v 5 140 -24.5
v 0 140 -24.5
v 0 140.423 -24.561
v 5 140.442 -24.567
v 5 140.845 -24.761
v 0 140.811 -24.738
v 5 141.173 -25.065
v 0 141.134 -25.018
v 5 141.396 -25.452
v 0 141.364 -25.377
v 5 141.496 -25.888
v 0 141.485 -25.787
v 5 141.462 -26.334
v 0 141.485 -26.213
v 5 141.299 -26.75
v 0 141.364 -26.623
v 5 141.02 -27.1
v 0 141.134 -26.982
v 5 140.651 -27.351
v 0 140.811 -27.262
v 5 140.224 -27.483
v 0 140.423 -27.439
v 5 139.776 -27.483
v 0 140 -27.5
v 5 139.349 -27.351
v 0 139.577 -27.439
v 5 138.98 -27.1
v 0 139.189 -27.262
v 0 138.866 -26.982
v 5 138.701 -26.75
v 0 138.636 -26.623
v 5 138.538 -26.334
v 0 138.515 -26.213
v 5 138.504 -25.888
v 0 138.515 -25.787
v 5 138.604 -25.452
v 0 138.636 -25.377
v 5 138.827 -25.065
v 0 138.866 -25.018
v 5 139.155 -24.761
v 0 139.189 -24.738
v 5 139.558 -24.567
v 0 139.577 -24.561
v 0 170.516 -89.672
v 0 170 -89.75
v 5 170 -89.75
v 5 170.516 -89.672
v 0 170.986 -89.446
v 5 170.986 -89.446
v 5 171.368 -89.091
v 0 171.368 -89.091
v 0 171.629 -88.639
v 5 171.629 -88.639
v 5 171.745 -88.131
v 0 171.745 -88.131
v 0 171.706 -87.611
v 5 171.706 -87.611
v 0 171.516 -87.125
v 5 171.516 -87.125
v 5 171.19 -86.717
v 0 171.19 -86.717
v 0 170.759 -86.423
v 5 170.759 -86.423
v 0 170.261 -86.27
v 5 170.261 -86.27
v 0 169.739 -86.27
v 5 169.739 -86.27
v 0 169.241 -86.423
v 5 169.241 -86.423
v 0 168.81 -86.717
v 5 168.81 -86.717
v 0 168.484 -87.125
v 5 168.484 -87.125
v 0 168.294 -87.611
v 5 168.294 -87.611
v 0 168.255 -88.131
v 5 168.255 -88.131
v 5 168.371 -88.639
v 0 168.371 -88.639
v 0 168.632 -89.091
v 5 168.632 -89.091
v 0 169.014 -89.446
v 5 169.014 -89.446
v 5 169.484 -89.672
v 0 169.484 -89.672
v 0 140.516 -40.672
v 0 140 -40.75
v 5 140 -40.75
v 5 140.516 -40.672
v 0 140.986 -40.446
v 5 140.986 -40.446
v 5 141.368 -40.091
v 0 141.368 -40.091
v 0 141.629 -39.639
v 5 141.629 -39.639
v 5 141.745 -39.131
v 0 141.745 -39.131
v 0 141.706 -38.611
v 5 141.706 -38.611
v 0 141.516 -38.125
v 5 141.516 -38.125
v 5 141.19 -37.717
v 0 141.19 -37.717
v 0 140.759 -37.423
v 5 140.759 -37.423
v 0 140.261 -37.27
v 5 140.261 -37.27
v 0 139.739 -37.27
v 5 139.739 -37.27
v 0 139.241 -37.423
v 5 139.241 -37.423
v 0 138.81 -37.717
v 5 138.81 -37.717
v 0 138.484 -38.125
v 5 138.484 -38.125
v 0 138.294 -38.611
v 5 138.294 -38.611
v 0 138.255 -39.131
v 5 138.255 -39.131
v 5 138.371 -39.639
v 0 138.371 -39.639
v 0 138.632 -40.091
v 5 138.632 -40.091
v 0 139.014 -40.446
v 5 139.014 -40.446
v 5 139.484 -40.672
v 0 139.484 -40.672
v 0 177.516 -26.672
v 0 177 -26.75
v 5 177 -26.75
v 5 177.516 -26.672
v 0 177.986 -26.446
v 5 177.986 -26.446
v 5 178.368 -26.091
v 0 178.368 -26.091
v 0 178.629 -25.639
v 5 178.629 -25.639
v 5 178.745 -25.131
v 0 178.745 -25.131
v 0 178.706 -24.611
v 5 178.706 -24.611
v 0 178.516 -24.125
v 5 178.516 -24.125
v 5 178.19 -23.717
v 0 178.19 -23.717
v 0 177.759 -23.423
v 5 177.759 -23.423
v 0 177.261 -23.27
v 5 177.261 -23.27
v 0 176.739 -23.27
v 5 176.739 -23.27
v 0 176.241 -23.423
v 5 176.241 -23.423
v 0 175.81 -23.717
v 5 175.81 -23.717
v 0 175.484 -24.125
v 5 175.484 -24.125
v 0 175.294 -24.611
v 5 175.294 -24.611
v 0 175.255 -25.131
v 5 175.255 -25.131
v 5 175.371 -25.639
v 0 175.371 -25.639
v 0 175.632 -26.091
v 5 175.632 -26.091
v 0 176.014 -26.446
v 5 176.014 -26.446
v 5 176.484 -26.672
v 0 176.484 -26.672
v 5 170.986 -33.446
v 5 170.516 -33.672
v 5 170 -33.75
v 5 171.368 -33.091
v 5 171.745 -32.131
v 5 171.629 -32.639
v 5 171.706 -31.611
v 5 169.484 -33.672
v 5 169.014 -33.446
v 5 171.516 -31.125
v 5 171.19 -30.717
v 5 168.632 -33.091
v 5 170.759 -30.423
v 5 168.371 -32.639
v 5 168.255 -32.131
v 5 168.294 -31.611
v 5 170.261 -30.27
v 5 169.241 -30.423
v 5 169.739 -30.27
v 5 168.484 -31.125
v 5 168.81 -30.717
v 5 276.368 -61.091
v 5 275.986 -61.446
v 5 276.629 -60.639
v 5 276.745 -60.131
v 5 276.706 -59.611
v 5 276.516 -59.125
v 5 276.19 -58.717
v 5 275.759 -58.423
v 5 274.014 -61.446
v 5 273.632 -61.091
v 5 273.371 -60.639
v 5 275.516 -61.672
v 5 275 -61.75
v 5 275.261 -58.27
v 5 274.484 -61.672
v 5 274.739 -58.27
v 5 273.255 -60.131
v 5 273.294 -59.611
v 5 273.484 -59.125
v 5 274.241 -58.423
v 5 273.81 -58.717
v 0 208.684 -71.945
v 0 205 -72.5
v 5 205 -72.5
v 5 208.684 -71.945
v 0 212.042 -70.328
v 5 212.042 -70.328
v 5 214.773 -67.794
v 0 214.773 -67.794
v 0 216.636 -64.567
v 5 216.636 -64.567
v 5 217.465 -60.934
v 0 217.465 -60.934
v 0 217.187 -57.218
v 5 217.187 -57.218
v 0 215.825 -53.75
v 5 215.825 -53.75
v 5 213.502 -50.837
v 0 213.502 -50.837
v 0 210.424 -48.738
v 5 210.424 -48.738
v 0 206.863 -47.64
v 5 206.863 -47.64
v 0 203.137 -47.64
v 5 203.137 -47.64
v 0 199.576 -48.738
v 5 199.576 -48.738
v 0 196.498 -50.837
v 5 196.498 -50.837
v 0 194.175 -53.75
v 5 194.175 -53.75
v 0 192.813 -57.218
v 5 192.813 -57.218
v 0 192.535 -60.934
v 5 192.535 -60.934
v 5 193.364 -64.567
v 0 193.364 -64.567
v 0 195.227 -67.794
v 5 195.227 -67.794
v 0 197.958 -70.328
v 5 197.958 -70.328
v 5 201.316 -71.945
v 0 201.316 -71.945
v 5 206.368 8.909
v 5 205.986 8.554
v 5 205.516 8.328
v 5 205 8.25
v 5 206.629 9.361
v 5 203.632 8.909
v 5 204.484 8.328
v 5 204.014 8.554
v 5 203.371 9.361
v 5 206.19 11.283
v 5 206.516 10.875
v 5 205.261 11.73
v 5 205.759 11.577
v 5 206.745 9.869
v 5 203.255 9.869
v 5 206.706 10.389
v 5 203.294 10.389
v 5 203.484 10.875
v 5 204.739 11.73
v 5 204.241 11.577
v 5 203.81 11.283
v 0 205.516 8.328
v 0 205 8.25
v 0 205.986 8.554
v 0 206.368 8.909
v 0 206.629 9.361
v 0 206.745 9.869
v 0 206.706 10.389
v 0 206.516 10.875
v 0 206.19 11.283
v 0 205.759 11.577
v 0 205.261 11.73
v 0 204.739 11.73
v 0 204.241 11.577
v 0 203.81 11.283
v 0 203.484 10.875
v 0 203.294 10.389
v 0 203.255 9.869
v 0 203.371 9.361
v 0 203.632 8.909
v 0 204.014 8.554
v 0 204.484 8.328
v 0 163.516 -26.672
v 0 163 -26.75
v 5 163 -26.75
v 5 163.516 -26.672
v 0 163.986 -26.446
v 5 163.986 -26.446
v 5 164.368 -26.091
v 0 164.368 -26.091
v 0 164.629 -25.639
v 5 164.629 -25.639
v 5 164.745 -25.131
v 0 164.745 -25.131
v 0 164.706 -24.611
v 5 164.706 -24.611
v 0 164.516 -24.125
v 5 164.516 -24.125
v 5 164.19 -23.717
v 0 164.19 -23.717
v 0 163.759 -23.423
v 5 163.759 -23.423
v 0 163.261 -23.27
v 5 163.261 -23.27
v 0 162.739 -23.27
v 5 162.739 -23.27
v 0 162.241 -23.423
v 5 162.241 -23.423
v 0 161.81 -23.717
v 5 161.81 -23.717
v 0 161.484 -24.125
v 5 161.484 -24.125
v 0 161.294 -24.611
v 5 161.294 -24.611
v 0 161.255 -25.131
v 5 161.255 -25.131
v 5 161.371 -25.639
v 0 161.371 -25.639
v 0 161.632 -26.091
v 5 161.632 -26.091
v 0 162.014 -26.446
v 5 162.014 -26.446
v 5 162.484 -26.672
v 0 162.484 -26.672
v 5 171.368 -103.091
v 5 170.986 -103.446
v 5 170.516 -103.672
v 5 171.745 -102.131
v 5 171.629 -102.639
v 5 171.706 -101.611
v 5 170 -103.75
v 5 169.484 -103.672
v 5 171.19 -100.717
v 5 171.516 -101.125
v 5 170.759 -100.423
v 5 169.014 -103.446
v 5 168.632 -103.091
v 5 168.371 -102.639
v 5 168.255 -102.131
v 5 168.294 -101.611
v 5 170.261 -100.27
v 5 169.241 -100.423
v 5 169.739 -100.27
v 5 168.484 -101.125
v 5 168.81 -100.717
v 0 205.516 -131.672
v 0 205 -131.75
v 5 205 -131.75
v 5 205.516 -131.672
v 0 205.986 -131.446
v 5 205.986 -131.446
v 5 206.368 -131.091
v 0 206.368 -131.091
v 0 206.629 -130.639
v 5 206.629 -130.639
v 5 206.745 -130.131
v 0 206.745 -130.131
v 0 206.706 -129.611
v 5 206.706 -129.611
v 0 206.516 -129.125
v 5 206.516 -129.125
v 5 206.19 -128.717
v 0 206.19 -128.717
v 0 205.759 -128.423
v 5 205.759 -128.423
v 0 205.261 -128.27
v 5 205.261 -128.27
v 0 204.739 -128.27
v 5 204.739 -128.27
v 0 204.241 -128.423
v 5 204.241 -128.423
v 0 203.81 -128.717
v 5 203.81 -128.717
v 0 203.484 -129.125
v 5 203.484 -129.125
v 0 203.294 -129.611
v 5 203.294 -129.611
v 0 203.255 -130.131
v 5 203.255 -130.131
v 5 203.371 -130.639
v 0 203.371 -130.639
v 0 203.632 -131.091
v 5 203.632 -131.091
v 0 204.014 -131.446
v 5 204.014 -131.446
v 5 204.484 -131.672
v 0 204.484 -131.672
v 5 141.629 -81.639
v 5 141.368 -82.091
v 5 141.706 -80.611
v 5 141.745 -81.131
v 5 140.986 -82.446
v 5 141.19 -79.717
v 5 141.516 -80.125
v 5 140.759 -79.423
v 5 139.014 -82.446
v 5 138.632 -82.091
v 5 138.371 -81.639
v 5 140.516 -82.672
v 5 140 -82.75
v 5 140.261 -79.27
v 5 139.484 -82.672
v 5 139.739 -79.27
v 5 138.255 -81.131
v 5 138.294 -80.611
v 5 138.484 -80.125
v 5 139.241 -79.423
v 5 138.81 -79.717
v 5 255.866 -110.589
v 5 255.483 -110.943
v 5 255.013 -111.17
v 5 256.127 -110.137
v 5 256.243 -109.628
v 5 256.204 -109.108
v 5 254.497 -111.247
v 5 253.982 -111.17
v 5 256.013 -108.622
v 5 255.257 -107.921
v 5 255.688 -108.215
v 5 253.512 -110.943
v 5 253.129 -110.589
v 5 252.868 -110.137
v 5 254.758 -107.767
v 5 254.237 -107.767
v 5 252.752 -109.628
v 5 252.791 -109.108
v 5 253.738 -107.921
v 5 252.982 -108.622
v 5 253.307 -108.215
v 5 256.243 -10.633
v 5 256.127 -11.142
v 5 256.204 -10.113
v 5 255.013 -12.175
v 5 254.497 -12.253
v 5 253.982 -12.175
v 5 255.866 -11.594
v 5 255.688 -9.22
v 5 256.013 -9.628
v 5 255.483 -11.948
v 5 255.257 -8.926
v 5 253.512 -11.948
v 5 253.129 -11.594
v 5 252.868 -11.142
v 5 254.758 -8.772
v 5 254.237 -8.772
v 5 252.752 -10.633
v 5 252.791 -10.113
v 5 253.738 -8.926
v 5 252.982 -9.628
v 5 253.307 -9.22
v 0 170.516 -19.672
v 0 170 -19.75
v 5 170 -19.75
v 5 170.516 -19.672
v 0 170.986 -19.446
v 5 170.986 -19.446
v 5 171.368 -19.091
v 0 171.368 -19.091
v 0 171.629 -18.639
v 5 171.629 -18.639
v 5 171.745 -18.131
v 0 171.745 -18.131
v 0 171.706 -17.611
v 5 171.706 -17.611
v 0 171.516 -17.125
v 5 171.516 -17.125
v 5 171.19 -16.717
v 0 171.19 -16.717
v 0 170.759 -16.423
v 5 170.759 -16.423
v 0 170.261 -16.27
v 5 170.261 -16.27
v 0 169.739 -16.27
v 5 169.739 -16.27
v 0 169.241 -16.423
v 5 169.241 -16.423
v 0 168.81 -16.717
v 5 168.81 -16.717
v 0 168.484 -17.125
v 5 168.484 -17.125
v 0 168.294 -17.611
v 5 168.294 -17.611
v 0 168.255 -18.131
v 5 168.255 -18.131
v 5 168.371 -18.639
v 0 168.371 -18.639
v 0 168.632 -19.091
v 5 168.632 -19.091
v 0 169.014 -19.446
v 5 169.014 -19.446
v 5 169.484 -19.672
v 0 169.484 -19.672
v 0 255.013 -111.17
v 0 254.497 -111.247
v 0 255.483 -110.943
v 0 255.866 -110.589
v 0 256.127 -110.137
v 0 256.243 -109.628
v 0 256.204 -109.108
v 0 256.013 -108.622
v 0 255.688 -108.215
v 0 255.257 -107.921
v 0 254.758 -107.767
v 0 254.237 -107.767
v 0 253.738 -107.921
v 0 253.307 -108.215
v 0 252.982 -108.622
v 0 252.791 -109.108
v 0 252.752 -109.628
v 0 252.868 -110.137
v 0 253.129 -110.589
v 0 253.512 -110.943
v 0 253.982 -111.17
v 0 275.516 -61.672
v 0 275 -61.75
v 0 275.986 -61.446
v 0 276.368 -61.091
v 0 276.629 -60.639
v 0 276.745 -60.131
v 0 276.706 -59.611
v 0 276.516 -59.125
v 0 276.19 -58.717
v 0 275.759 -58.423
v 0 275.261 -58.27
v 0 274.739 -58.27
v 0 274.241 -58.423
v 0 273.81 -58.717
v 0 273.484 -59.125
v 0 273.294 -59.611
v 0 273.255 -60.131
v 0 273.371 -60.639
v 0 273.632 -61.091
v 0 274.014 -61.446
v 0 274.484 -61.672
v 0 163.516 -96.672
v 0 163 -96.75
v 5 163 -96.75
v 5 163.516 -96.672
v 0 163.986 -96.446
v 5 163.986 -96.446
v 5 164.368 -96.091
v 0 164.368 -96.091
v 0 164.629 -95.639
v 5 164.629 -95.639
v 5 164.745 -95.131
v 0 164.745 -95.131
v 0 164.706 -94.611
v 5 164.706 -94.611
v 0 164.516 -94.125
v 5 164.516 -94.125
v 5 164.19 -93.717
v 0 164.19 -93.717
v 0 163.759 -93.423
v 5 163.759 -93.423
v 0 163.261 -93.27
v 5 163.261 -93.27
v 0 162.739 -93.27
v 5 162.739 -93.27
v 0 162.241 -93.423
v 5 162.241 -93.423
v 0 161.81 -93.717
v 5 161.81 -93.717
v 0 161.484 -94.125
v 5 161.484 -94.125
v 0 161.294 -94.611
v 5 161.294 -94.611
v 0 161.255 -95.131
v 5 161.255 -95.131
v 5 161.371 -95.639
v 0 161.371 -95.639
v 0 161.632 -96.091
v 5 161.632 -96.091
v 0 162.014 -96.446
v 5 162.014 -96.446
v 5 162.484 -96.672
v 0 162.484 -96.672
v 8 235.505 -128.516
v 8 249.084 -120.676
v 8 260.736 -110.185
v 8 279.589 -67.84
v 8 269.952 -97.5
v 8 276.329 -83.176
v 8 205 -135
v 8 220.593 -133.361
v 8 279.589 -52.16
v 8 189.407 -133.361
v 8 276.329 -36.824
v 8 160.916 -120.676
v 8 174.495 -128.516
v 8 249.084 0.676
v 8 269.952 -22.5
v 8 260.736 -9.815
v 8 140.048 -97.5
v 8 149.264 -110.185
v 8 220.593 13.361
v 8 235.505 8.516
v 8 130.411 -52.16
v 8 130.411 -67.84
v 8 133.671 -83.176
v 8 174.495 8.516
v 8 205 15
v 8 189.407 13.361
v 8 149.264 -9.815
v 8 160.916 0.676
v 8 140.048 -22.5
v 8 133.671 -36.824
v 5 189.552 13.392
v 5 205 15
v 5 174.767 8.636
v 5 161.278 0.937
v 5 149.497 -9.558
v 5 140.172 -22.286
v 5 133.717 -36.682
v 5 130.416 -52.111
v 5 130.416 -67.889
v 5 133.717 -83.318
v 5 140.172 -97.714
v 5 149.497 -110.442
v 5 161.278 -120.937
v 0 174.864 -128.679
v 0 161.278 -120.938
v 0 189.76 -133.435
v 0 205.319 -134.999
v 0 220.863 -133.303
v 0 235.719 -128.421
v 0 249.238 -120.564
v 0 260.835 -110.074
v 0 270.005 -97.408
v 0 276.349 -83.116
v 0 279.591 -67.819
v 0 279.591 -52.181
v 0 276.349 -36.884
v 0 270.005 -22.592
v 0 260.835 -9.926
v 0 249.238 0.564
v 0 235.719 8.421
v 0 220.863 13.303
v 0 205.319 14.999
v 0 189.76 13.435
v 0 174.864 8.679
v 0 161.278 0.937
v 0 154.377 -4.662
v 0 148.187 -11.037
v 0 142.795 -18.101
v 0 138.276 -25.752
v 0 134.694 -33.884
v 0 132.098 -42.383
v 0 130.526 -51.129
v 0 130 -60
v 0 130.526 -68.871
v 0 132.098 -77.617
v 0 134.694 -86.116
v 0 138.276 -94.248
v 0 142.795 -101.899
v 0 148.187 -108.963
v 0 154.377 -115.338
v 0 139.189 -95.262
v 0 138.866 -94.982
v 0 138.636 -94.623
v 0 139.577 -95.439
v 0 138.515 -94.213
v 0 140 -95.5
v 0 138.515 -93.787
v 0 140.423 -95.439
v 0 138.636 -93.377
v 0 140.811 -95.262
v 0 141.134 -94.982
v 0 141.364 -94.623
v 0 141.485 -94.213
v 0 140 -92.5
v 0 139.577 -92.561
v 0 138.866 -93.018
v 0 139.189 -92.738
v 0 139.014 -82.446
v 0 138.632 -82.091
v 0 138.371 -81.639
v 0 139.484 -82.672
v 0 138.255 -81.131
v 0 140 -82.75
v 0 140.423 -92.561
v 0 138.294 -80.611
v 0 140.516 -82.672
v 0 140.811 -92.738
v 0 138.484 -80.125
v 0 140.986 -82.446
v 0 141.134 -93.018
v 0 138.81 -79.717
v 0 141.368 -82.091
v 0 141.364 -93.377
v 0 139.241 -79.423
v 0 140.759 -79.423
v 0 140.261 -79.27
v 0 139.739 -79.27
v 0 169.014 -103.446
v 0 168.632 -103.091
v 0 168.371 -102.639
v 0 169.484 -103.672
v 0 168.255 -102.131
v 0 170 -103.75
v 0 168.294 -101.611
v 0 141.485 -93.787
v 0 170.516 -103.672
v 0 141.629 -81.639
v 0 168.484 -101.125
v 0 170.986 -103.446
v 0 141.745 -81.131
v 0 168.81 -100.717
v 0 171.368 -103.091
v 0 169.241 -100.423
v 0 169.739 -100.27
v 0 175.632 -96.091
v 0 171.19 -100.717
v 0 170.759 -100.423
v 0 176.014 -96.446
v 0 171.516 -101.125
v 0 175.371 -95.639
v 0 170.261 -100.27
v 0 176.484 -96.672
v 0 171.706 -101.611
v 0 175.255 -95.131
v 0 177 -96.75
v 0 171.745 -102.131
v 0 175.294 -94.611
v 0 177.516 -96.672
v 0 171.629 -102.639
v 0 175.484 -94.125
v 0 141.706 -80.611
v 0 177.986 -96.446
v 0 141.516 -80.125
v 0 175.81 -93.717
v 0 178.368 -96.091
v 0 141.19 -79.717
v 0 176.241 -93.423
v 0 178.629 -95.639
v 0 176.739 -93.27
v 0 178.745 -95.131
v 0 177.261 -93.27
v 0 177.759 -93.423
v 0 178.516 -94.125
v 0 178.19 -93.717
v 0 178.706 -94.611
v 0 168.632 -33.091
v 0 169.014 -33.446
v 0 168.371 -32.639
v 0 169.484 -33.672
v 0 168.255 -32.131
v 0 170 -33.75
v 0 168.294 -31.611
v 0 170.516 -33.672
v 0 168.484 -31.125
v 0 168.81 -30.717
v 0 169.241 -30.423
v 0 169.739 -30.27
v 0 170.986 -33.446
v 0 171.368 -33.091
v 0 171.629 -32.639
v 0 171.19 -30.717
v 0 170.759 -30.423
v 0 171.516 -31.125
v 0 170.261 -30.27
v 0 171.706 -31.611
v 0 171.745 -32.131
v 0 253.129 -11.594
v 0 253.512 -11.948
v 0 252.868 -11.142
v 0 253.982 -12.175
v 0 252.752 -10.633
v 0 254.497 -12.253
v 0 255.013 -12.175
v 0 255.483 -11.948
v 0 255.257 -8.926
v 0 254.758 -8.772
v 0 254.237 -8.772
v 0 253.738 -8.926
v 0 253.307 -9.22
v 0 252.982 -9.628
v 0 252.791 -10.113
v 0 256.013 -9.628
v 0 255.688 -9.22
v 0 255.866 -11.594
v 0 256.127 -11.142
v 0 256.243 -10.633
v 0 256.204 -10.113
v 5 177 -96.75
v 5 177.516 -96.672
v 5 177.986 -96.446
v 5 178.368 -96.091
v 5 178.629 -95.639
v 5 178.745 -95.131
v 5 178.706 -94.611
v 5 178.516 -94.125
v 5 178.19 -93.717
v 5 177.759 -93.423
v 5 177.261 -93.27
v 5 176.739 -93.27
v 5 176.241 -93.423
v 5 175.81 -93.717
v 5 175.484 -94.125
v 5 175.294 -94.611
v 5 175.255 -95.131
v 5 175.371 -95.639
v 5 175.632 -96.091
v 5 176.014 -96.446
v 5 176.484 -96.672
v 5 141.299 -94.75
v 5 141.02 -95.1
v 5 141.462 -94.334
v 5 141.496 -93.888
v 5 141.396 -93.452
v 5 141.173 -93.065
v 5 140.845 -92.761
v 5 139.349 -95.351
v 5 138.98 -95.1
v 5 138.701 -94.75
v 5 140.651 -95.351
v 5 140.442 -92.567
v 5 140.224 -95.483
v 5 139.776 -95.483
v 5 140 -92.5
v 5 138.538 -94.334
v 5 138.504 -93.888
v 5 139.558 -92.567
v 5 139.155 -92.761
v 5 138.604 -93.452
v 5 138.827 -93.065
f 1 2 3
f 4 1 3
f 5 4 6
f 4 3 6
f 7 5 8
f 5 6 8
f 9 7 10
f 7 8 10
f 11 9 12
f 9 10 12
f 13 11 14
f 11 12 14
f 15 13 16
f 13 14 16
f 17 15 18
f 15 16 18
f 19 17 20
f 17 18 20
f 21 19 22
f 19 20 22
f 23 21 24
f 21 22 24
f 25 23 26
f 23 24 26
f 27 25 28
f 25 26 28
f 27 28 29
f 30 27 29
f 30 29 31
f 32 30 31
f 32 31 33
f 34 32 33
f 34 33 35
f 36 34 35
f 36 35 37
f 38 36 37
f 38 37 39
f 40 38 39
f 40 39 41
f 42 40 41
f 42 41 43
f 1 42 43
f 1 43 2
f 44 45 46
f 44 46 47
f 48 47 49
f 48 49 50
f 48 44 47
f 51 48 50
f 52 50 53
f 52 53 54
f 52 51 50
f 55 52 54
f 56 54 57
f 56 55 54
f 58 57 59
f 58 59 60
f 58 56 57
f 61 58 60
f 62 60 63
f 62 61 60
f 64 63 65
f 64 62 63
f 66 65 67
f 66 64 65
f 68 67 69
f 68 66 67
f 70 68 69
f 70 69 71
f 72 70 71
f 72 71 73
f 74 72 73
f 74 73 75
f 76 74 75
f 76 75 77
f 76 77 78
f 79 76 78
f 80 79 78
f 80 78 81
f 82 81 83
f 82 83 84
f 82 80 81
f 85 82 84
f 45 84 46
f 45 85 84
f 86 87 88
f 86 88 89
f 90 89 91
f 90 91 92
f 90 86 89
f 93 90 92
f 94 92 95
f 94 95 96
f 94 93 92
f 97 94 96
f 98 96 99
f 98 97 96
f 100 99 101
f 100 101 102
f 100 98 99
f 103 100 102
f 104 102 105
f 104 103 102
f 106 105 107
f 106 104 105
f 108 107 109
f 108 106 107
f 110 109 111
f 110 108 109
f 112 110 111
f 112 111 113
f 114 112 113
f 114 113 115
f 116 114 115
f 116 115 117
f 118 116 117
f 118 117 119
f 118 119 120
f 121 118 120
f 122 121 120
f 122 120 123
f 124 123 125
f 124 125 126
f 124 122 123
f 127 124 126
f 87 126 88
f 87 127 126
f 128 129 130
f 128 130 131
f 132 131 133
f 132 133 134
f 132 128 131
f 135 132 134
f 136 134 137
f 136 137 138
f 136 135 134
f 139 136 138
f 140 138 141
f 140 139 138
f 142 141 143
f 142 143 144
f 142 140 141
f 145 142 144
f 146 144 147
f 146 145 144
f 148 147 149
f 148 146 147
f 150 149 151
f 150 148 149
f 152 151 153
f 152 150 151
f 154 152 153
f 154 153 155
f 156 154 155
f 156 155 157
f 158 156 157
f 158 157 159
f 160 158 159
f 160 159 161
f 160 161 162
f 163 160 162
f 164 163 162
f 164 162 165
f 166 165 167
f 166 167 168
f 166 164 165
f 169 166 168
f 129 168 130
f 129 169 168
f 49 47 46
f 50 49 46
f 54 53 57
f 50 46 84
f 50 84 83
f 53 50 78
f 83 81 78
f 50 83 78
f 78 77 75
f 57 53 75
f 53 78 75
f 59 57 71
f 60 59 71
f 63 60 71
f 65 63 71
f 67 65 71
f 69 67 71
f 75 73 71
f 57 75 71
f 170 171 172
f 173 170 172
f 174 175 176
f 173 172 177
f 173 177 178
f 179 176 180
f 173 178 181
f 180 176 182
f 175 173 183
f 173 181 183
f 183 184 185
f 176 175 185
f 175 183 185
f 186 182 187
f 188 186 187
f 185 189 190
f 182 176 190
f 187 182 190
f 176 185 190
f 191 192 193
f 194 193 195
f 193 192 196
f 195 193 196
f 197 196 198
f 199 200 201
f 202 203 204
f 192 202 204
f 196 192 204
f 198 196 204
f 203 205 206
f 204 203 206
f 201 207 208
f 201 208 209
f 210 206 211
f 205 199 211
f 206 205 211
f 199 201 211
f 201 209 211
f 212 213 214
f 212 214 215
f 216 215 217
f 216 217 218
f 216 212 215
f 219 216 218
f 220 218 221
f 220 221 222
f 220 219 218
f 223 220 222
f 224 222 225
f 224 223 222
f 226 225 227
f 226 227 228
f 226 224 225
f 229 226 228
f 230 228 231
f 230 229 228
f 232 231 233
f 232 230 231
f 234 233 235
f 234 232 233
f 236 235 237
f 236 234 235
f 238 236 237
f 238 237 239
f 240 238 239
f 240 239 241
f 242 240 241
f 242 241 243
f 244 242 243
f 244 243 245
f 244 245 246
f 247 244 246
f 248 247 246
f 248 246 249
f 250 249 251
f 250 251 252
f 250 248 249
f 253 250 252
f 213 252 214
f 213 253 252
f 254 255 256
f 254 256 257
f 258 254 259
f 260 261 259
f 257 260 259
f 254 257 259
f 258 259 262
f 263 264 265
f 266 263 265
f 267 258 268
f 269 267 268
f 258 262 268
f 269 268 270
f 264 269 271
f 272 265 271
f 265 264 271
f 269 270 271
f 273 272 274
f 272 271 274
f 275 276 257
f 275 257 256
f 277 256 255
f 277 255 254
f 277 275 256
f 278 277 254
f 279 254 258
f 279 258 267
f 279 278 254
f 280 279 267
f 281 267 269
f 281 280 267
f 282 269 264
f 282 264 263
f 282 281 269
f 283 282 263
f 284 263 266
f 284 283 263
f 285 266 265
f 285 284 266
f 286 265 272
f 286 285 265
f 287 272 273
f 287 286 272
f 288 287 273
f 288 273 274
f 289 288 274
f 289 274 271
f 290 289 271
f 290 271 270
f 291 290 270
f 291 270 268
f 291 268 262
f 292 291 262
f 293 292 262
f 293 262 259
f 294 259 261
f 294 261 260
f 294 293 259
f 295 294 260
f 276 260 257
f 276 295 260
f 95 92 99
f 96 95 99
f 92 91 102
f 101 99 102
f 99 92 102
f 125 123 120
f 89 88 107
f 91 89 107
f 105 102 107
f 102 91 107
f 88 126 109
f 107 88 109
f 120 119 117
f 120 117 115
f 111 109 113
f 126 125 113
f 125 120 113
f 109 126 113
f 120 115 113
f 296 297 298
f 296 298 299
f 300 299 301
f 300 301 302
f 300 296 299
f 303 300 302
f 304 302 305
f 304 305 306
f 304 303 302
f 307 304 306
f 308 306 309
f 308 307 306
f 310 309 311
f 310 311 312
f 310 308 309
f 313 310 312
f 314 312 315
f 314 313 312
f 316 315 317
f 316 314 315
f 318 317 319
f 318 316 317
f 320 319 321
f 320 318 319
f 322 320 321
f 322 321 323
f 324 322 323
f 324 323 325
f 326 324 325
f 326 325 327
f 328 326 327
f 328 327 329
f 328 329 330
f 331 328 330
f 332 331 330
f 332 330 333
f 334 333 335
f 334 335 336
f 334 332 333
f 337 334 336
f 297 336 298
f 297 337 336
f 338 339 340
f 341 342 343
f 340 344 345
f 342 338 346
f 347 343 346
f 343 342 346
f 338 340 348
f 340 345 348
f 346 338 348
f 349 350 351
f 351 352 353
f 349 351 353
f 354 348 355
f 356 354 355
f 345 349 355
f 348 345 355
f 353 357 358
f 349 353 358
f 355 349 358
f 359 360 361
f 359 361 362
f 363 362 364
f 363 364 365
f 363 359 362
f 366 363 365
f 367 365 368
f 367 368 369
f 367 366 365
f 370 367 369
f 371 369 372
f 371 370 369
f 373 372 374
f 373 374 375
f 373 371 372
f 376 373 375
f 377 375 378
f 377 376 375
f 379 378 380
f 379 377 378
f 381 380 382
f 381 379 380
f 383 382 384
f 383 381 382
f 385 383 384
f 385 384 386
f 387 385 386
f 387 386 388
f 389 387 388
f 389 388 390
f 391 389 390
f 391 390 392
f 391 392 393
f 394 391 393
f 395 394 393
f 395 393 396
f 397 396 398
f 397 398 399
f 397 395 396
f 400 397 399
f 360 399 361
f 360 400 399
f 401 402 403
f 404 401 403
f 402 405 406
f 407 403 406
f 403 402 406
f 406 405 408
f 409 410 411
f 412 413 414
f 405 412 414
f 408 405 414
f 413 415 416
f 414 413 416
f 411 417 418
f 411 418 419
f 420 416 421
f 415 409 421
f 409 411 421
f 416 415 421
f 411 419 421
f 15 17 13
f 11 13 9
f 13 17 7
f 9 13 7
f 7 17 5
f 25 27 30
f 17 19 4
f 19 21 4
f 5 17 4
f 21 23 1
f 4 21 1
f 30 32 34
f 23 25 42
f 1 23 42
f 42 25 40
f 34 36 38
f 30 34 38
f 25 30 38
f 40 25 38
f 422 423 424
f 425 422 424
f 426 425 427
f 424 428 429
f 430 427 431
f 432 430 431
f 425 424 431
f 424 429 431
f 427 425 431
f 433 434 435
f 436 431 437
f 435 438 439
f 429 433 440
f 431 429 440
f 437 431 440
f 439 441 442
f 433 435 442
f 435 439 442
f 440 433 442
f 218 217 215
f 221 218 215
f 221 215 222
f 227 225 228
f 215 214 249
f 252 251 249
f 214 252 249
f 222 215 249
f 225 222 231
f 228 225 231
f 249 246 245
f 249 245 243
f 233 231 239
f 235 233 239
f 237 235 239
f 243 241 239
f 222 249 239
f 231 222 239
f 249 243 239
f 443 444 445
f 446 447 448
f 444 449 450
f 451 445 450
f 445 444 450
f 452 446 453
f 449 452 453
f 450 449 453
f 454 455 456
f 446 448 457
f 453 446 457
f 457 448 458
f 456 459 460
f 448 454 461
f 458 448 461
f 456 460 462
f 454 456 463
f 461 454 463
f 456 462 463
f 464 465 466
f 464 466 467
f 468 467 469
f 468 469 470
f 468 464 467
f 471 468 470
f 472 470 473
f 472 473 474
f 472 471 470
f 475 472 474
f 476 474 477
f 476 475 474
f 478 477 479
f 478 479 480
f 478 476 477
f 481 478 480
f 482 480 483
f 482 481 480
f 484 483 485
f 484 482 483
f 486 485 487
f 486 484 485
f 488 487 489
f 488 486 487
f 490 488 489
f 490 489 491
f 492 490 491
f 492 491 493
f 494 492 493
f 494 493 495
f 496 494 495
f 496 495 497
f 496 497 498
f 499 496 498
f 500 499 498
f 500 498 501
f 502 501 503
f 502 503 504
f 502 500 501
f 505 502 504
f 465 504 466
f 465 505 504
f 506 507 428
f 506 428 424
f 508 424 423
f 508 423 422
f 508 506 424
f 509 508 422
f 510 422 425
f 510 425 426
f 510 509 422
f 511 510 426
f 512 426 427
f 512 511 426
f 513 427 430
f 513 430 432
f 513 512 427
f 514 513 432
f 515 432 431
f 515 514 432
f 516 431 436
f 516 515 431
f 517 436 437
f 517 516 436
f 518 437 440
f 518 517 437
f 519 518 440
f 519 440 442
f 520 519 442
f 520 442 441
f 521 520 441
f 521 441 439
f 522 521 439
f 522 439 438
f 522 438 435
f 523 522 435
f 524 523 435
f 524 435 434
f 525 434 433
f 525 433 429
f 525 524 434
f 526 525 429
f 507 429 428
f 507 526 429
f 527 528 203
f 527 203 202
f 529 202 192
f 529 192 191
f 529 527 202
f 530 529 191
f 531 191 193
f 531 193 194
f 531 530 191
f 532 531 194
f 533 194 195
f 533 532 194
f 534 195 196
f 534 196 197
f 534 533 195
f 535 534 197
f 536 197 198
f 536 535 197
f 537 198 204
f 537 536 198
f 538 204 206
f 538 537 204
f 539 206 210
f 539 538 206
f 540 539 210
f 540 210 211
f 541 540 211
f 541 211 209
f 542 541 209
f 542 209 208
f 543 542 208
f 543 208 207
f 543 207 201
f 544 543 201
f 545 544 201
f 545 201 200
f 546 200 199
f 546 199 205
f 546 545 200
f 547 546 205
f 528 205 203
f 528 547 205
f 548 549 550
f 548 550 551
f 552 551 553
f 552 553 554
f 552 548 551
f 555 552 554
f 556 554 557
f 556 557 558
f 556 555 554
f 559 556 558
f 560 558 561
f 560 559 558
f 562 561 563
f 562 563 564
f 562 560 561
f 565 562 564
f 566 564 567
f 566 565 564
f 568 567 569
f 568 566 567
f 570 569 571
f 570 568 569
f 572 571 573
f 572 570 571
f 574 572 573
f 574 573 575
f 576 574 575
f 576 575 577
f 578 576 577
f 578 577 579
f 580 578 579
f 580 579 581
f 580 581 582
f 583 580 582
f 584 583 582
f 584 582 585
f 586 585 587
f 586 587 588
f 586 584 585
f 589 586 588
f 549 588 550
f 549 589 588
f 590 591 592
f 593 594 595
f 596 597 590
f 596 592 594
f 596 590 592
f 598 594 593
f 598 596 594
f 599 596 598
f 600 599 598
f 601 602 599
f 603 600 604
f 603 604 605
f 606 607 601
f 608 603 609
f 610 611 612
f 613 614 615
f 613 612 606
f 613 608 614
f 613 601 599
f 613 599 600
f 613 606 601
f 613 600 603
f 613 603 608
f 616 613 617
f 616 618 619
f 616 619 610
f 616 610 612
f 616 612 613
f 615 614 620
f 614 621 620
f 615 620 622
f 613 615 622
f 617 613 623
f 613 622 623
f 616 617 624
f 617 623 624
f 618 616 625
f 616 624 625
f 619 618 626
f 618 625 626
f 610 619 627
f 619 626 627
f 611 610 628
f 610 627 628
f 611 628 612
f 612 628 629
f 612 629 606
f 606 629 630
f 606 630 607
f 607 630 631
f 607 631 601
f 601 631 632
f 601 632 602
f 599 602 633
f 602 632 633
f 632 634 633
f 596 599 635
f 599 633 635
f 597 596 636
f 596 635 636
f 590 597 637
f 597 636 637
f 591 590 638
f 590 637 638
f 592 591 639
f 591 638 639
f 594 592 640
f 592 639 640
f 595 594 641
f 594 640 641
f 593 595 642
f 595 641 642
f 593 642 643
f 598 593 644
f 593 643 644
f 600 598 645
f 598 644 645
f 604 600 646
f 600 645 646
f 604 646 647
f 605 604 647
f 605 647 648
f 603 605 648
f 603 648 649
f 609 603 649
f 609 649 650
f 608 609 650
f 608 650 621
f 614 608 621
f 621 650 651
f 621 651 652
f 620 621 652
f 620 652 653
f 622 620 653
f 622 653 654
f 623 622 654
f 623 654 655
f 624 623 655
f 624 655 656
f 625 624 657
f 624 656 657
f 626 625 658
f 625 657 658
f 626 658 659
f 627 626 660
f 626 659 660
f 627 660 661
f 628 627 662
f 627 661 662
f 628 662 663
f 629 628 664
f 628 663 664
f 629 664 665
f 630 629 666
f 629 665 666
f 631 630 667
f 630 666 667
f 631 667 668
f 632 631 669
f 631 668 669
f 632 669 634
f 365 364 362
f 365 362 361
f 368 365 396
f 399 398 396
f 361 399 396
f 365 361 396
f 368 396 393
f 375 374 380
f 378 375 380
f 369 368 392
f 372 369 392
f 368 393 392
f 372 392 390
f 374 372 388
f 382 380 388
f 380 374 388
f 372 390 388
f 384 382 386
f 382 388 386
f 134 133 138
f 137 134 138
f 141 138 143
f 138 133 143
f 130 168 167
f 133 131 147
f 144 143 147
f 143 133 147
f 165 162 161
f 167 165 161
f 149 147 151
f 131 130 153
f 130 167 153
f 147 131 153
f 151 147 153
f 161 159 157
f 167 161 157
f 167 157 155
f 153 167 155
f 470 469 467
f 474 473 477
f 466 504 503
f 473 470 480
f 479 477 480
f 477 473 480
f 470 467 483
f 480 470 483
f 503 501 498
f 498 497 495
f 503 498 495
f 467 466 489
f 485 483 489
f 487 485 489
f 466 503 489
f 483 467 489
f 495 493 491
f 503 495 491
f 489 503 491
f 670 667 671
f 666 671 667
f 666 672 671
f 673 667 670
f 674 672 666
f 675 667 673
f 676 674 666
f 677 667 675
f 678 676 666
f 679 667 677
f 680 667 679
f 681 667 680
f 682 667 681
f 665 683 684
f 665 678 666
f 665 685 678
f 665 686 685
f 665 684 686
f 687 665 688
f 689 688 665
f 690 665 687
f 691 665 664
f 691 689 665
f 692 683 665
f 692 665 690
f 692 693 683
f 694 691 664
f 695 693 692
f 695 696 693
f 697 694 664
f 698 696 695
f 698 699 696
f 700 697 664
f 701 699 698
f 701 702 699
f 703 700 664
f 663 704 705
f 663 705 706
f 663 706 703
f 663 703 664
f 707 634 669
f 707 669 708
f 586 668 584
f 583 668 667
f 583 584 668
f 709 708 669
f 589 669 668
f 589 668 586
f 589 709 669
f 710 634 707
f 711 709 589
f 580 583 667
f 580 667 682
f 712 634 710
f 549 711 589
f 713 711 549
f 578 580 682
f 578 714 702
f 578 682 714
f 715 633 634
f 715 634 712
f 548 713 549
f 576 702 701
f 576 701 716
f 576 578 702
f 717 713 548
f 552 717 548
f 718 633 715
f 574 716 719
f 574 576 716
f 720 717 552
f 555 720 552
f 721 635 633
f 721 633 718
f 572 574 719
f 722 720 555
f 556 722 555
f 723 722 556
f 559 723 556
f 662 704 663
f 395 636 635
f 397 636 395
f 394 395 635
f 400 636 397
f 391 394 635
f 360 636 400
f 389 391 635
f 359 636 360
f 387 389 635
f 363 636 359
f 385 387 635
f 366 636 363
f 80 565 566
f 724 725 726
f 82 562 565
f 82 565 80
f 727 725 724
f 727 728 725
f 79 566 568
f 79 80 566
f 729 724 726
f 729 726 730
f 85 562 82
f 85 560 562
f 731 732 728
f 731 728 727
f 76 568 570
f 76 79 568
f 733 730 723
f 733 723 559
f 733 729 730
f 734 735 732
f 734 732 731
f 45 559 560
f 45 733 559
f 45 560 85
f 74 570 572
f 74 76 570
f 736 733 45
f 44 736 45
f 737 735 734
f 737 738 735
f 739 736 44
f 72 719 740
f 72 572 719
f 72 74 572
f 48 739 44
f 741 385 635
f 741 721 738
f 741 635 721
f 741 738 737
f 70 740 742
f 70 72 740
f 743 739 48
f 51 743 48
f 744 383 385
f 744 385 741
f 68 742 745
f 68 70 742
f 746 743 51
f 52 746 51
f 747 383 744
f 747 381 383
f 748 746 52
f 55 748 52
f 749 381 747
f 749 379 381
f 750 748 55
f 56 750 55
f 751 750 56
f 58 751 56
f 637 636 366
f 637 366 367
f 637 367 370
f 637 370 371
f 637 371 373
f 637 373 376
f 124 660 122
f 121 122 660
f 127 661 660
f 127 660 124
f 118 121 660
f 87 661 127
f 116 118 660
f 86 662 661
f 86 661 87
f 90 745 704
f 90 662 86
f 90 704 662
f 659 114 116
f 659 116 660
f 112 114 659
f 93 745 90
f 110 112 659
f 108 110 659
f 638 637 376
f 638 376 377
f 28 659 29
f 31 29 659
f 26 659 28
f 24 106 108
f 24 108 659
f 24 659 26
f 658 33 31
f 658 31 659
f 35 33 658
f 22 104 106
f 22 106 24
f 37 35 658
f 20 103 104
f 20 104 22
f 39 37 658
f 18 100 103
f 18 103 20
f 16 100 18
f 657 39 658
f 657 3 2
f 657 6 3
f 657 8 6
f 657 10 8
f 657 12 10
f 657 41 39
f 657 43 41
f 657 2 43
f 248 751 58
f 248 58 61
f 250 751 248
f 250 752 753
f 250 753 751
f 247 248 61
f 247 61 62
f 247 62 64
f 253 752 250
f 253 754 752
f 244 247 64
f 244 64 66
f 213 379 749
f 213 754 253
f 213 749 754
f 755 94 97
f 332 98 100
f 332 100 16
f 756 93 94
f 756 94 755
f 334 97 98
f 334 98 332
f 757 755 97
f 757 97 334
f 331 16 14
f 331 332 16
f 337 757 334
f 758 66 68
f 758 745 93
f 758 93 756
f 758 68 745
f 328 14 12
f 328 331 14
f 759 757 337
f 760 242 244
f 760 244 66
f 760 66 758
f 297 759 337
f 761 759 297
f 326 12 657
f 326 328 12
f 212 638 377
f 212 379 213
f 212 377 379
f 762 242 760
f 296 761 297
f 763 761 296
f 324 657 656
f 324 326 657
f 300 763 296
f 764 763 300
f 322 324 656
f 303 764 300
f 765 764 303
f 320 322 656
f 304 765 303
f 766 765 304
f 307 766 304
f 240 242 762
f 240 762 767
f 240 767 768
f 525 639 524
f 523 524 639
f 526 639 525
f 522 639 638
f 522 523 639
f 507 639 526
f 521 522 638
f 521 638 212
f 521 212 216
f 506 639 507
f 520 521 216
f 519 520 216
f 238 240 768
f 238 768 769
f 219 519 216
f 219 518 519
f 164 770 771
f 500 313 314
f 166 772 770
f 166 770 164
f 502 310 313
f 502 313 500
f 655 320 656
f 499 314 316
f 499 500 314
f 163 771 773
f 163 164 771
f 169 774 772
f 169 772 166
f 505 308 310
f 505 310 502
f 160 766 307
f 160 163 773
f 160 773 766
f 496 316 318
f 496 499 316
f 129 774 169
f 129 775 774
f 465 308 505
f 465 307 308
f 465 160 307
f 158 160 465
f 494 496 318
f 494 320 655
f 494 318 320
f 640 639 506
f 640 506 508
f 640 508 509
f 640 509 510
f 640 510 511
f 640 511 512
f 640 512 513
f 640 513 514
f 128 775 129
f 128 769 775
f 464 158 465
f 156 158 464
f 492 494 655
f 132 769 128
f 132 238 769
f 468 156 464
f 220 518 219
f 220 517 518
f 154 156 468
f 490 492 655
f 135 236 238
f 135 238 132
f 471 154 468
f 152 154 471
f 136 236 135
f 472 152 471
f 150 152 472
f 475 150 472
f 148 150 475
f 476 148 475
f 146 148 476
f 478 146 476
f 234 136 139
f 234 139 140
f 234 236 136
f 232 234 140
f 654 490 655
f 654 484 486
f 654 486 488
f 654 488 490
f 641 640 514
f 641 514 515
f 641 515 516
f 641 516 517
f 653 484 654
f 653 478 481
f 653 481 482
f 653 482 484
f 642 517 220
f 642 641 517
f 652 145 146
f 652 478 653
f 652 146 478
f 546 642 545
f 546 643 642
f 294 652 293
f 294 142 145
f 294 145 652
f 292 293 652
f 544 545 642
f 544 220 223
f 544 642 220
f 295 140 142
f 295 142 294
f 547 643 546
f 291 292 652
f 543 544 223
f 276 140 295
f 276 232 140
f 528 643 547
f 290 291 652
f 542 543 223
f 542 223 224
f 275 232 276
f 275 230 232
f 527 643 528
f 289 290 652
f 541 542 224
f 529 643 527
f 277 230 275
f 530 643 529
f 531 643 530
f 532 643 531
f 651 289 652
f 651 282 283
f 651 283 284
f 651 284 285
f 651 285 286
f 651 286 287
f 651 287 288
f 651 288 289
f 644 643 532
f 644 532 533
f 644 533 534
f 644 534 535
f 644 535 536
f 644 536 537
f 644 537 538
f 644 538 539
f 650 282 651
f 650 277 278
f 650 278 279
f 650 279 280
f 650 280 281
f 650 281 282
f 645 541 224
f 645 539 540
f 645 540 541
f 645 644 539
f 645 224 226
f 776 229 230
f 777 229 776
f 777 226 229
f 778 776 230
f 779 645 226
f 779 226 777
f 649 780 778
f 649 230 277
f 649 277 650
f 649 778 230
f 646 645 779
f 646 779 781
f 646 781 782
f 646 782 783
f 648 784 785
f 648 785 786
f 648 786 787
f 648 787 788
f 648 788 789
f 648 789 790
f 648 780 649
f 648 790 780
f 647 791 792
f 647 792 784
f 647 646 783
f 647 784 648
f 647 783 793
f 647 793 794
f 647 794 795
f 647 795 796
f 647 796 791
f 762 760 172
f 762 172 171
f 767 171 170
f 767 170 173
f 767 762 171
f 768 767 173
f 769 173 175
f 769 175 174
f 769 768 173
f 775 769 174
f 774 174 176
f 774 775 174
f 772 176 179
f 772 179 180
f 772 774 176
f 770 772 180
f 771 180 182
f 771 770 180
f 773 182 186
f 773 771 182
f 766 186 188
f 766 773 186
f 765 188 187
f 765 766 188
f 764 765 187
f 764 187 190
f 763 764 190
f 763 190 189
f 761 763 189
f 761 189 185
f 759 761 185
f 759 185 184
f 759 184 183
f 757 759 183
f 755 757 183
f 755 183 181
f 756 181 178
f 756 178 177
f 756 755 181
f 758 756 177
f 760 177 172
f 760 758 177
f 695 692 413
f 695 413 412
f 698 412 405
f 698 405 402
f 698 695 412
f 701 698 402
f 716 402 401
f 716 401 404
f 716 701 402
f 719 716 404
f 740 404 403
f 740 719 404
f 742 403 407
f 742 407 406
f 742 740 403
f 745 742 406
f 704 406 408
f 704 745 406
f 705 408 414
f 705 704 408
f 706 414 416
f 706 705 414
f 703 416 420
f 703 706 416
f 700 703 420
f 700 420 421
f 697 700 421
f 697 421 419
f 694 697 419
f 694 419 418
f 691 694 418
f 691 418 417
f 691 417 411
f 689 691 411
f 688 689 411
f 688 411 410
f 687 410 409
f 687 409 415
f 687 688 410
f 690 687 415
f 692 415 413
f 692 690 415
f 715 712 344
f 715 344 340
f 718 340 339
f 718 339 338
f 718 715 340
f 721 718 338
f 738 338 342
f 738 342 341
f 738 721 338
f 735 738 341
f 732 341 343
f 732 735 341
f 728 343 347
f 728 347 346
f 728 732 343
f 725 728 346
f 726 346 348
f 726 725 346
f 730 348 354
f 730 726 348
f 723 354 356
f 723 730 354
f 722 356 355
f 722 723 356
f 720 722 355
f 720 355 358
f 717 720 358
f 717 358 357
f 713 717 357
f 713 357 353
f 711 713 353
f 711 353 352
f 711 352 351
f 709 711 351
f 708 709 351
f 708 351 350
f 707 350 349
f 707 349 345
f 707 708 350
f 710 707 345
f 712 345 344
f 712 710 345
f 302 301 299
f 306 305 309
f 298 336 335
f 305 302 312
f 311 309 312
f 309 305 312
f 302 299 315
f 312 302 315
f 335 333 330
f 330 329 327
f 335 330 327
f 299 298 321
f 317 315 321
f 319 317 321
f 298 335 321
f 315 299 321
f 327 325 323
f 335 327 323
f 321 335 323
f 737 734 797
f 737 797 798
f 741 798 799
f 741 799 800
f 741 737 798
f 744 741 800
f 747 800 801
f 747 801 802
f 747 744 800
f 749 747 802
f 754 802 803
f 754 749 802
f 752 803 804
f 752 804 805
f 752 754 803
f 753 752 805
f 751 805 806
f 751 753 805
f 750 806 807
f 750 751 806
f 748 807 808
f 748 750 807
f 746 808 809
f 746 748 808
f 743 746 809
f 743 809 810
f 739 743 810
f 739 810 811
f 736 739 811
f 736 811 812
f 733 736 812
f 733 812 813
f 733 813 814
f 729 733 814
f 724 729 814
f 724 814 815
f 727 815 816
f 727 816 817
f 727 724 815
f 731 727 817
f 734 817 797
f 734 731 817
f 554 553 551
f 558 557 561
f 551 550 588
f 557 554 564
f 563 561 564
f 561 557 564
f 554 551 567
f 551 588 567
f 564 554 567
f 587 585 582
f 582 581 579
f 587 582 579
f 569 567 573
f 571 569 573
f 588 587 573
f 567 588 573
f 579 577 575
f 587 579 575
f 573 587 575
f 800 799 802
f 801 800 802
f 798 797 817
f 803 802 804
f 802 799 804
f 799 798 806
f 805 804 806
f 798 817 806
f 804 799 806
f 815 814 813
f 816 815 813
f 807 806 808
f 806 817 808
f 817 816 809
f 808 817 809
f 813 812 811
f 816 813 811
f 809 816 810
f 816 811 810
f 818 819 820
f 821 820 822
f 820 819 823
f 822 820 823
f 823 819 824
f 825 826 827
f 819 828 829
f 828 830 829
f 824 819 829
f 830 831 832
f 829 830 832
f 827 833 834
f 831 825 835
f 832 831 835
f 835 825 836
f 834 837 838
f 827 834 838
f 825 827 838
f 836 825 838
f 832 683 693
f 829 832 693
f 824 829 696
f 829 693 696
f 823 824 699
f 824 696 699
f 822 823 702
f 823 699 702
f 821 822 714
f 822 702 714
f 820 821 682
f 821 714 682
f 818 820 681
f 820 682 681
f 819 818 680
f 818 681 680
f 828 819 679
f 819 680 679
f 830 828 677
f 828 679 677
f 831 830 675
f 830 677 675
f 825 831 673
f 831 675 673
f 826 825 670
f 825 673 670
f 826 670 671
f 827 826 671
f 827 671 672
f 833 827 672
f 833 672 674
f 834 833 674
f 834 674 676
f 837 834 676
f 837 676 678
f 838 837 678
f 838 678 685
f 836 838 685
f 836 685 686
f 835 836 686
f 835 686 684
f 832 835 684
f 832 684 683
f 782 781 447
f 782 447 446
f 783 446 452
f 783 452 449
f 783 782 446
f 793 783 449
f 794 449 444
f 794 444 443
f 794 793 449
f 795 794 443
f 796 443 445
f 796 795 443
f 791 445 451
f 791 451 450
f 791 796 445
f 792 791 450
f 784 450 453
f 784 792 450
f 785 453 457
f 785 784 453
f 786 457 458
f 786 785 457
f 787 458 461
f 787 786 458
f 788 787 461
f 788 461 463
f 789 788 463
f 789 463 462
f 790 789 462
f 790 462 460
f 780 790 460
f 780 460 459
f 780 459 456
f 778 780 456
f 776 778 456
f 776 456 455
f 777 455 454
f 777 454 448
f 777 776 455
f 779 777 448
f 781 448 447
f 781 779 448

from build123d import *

# Parameters (mm, degrees)
SKETCH_1_R          = 12.5
SKETCH_1_R_2        = 1.75
EXTRUDE_1_DEPTH     = 5
FILLET_1_R          = 5
SKETCH_3_R          = 1.1
CUT_EXTRUDE_2_DEPTH = 10
SKETCH_4_R          = 1.5
CUT_EXTRUDE_3_DEPTH = 10
EXTRUDE1_DEPTH      = 311.885831134
SKETCH2_R           = 75
EXTRUDE2_DEPTH      = 3


with BuildPart() as part:
    # 草图1 → 凸台-拉伸1 (new body)
    with BuildSketch(Plane(origin=(0, 0, 0), x_dir=(0, 0, -1), z_dir=(1, 0, 0))):
        with BuildLine():
            Line((0, 0), (0, 160))
            ThreePointArc((0, 160), (60, 280), (120, 160))
            Line((120, 160), (120, 0))
            Line((120, 0), (0, 0))
        make_face()
        with Locations((60, 205)):
            Circle(SKETCH_1_R, mode=Mode.SUBTRACT)
        with Locations((25, 177)):
            Circle(SKETCH_1_R_2, mode=Mode.SUBTRACT)
        with Locations((32, 170)):
            Circle(SKETCH_1_R_2, mode=Mode.SUBTRACT)
        with Locations((25, 163)):
            Circle(SKETCH_1_R_2, mode=Mode.SUBTRACT)
        with Locations((18, 170)):
            Circle(SKETCH_1_R_2, mode=Mode.SUBTRACT)
        with Locations((95, 177)):
            Circle(SKETCH_1_R_2, mode=Mode.SUBTRACT)
        with Locations((102, 170)):
            Circle(SKETCH_1_R_2, mode=Mode.SUBTRACT)
        with Locations((95, 163)):
            Circle(SKETCH_1_R_2, mode=Mode.SUBTRACT)
        with Locations((88, 170)):
            Circle(SKETCH_1_R_2, mode=Mode.SUBTRACT)
        with Locations((39, 140)):
            Circle(SKETCH_1_R_2, mode=Mode.SUBTRACT)
        with Locations((81, 140)):
            Circle(SKETCH_1_R_2, mode=Mode.SUBTRACT)
        with Locations((60, 275)):
            Circle(SKETCH_1_R_2, mode=Mode.SUBTRACT)
        with Locations((-10, 205)):
            Circle(SKETCH_1_R_2, mode=Mode.SUBTRACT)
        with Locations((130, 205)):
            Circle(SKETCH_1_R_2, mode=Mode.SUBTRACT)
        with Locations((10.502525317, 254.497474683)):
            Circle(SKETCH_1_R_2, mode=Mode.SUBTRACT)
        with Locations((109.497474683, 254.497474683)):
            Circle(SKETCH_1_R_2, mode=Mode.SUBTRACT)
        with Locations((5, 5)):
            Circle(SKETCH_1_R_2, mode=Mode.SUBTRACT)
        with Locations((115, 5)):
            Circle(SKETCH_1_R_2, mode=Mode.SUBTRACT)
        with Locations((5, 120)):
            Circle(SKETCH_1_R_2, mode=Mode.SUBTRACT)
        with Locations((115, 120)):
            Circle(SKETCH_1_R_2, mode=Mode.SUBTRACT)
        with BuildLine():
            Line((40.5, 81), (40.5, 59))
            ThreePointArc((40.5, 59), (39, 57.5), (37.5, 59))
            Line((37.5, 59), (37.5, 81))
            ThreePointArc((37.5, 81), (39, 82.5), (40.5, 81))
        make_face(mode=Mode.SUBTRACT)
        with BuildLine():
            Line((79.5, 81), (79.5, 59))
            ThreePointArc((79.5, 59), (81, 57.5), (82.5, 59))
            Line((82.5, 59), (82.5, 81))
            ThreePointArc((82.5, 81), (81, 82.5), (79.5, 81))
        make_face(mode=Mode.SUBTRACT)
    extrude(amount=EXTRUDE_1_DEPTH)

    # 圆角1
    fillet_1_edges = [part.edges().sort_by_distance(p)[0] for p in [
        (2.5, 0, 0),
        (2.5, 160, 0),
        (2.5, 160, -120),
        (2.5, 0, -120),
    ]]
    fillet(fillet_1_edges, radius=FILLET_1_R)

    # 草图3 → 切除-拉伸2 (cut)
    with BuildSketch(Plane.ZY):
        with Locations((-45.818141739, 127.45827935)):
            Circle(SKETCH_3_R)
        with Locations((-61.818141739, 127.45827935)):
            Circle(SKETCH_3_R)
        with Locations((-45.818141739, 91.45827935)):
            Circle(SKETCH_3_R)
        with Locations((-61.818141739, 91.45827935)):
            Circle(SKETCH_3_R)
        with BuildLine():
            Line((-20, 46.75), (-30, 46.75))
            ThreePointArc((-30, 46.75), (-31.75, 48.5), (-30, 50.25))
            Line((-30, 50.25), (-20, 50.25))
            ThreePointArc((-20, 50.25), (-18.25, 48.5), (-20, 46.75))
        make_face()
        with BuildLine():
            Line((-90, 46.75), (-100, 46.75))
            ThreePointArc((-100, 46.75), (-101.75, 48.5), (-100, 50.25))
            Line((-100, 50.25), (-90, 50.25))
            ThreePointArc((-90, 50.25), (-88.25, 48.5), (-90, 46.75))
        make_face()
        with BuildLine():
            Line((-20, 8.25), (-30, 8.25))
            ThreePointArc((-30, 8.25), (-31.75, 10), (-30, 11.75))
            Line((-30, 11.75), (-20, 11.75))
            ThreePointArc((-20, 11.75), (-18.25, 10), (-20, 8.25))
        make_face()
        with BuildLine():
            Line((-90, 8.25), (-100, 8.25))
            ThreePointArc((-100, 8.25), (-101.75, 10), (-100, 11.75))
            Line((-100, 11.75), (-90, 11.75))
            ThreePointArc((-90, 11.75), (-88.25, 10), (-90, 8.25))
        make_face()
    extrude(amount=-CUT_EXTRUDE_2_DEPTH, mode=Mode.SUBTRACT)

    # 草图4 → 切除-拉伸3 (cut)
    with BuildSketch(Plane.ZY):
        with Locations((-16.118918229, 88.740617872)):
            Circle(SKETCH_4_R)
        with Locations((-16.118918229, 64.240617872)):
            Circle(SKETCH_4_R)
        with Locations((-94, 140)):
            Circle(SKETCH_4_R)
        with Locations((-26, 140)):
            Circle(SKETCH_4_R)
        with Locations((-94, 82)):
            Circle(SKETCH_4_R)
        with Locations((-26, 82)):
            Circle(SKETCH_4_R)
    extrude(amount=-CUT_EXTRUDE_3_DEPTH, mode=Mode.SUBTRACT)

    # Sketch1 → Extrude1 (cut, through all)
    with BuildSketch(Plane.ZY):
        with BuildLine():
            Line((0.9375, 161.277910689), (0.9375, -17.17747431))
            Line((0.9375, -17.17747431), (-120, -17.17747431))
            Line((-120, -17.17747431), (-120.9375, 161.277910689))
            ThreePointArc((-120.9375, 161.277910689), (-60, 130), (0.9375, 161.277910689))
        make_face()
    extrude(amount=-EXTRUDE1_DEPTH, mode=Mode.SUBTRACT)

    # Sketch2 → Extrude2 (add)
    with BuildSketch(Plane(origin=(5, 0, 0), x_dir=(0, 0, -1), z_dir=(1, 0, 0))):
        with Locations(Location((60, 205, 0), (0, 0, 180))):
            Circle(SKETCH2_R)
    extrude(amount=EXTRUDE2_DEPTH)


solid = part.part
